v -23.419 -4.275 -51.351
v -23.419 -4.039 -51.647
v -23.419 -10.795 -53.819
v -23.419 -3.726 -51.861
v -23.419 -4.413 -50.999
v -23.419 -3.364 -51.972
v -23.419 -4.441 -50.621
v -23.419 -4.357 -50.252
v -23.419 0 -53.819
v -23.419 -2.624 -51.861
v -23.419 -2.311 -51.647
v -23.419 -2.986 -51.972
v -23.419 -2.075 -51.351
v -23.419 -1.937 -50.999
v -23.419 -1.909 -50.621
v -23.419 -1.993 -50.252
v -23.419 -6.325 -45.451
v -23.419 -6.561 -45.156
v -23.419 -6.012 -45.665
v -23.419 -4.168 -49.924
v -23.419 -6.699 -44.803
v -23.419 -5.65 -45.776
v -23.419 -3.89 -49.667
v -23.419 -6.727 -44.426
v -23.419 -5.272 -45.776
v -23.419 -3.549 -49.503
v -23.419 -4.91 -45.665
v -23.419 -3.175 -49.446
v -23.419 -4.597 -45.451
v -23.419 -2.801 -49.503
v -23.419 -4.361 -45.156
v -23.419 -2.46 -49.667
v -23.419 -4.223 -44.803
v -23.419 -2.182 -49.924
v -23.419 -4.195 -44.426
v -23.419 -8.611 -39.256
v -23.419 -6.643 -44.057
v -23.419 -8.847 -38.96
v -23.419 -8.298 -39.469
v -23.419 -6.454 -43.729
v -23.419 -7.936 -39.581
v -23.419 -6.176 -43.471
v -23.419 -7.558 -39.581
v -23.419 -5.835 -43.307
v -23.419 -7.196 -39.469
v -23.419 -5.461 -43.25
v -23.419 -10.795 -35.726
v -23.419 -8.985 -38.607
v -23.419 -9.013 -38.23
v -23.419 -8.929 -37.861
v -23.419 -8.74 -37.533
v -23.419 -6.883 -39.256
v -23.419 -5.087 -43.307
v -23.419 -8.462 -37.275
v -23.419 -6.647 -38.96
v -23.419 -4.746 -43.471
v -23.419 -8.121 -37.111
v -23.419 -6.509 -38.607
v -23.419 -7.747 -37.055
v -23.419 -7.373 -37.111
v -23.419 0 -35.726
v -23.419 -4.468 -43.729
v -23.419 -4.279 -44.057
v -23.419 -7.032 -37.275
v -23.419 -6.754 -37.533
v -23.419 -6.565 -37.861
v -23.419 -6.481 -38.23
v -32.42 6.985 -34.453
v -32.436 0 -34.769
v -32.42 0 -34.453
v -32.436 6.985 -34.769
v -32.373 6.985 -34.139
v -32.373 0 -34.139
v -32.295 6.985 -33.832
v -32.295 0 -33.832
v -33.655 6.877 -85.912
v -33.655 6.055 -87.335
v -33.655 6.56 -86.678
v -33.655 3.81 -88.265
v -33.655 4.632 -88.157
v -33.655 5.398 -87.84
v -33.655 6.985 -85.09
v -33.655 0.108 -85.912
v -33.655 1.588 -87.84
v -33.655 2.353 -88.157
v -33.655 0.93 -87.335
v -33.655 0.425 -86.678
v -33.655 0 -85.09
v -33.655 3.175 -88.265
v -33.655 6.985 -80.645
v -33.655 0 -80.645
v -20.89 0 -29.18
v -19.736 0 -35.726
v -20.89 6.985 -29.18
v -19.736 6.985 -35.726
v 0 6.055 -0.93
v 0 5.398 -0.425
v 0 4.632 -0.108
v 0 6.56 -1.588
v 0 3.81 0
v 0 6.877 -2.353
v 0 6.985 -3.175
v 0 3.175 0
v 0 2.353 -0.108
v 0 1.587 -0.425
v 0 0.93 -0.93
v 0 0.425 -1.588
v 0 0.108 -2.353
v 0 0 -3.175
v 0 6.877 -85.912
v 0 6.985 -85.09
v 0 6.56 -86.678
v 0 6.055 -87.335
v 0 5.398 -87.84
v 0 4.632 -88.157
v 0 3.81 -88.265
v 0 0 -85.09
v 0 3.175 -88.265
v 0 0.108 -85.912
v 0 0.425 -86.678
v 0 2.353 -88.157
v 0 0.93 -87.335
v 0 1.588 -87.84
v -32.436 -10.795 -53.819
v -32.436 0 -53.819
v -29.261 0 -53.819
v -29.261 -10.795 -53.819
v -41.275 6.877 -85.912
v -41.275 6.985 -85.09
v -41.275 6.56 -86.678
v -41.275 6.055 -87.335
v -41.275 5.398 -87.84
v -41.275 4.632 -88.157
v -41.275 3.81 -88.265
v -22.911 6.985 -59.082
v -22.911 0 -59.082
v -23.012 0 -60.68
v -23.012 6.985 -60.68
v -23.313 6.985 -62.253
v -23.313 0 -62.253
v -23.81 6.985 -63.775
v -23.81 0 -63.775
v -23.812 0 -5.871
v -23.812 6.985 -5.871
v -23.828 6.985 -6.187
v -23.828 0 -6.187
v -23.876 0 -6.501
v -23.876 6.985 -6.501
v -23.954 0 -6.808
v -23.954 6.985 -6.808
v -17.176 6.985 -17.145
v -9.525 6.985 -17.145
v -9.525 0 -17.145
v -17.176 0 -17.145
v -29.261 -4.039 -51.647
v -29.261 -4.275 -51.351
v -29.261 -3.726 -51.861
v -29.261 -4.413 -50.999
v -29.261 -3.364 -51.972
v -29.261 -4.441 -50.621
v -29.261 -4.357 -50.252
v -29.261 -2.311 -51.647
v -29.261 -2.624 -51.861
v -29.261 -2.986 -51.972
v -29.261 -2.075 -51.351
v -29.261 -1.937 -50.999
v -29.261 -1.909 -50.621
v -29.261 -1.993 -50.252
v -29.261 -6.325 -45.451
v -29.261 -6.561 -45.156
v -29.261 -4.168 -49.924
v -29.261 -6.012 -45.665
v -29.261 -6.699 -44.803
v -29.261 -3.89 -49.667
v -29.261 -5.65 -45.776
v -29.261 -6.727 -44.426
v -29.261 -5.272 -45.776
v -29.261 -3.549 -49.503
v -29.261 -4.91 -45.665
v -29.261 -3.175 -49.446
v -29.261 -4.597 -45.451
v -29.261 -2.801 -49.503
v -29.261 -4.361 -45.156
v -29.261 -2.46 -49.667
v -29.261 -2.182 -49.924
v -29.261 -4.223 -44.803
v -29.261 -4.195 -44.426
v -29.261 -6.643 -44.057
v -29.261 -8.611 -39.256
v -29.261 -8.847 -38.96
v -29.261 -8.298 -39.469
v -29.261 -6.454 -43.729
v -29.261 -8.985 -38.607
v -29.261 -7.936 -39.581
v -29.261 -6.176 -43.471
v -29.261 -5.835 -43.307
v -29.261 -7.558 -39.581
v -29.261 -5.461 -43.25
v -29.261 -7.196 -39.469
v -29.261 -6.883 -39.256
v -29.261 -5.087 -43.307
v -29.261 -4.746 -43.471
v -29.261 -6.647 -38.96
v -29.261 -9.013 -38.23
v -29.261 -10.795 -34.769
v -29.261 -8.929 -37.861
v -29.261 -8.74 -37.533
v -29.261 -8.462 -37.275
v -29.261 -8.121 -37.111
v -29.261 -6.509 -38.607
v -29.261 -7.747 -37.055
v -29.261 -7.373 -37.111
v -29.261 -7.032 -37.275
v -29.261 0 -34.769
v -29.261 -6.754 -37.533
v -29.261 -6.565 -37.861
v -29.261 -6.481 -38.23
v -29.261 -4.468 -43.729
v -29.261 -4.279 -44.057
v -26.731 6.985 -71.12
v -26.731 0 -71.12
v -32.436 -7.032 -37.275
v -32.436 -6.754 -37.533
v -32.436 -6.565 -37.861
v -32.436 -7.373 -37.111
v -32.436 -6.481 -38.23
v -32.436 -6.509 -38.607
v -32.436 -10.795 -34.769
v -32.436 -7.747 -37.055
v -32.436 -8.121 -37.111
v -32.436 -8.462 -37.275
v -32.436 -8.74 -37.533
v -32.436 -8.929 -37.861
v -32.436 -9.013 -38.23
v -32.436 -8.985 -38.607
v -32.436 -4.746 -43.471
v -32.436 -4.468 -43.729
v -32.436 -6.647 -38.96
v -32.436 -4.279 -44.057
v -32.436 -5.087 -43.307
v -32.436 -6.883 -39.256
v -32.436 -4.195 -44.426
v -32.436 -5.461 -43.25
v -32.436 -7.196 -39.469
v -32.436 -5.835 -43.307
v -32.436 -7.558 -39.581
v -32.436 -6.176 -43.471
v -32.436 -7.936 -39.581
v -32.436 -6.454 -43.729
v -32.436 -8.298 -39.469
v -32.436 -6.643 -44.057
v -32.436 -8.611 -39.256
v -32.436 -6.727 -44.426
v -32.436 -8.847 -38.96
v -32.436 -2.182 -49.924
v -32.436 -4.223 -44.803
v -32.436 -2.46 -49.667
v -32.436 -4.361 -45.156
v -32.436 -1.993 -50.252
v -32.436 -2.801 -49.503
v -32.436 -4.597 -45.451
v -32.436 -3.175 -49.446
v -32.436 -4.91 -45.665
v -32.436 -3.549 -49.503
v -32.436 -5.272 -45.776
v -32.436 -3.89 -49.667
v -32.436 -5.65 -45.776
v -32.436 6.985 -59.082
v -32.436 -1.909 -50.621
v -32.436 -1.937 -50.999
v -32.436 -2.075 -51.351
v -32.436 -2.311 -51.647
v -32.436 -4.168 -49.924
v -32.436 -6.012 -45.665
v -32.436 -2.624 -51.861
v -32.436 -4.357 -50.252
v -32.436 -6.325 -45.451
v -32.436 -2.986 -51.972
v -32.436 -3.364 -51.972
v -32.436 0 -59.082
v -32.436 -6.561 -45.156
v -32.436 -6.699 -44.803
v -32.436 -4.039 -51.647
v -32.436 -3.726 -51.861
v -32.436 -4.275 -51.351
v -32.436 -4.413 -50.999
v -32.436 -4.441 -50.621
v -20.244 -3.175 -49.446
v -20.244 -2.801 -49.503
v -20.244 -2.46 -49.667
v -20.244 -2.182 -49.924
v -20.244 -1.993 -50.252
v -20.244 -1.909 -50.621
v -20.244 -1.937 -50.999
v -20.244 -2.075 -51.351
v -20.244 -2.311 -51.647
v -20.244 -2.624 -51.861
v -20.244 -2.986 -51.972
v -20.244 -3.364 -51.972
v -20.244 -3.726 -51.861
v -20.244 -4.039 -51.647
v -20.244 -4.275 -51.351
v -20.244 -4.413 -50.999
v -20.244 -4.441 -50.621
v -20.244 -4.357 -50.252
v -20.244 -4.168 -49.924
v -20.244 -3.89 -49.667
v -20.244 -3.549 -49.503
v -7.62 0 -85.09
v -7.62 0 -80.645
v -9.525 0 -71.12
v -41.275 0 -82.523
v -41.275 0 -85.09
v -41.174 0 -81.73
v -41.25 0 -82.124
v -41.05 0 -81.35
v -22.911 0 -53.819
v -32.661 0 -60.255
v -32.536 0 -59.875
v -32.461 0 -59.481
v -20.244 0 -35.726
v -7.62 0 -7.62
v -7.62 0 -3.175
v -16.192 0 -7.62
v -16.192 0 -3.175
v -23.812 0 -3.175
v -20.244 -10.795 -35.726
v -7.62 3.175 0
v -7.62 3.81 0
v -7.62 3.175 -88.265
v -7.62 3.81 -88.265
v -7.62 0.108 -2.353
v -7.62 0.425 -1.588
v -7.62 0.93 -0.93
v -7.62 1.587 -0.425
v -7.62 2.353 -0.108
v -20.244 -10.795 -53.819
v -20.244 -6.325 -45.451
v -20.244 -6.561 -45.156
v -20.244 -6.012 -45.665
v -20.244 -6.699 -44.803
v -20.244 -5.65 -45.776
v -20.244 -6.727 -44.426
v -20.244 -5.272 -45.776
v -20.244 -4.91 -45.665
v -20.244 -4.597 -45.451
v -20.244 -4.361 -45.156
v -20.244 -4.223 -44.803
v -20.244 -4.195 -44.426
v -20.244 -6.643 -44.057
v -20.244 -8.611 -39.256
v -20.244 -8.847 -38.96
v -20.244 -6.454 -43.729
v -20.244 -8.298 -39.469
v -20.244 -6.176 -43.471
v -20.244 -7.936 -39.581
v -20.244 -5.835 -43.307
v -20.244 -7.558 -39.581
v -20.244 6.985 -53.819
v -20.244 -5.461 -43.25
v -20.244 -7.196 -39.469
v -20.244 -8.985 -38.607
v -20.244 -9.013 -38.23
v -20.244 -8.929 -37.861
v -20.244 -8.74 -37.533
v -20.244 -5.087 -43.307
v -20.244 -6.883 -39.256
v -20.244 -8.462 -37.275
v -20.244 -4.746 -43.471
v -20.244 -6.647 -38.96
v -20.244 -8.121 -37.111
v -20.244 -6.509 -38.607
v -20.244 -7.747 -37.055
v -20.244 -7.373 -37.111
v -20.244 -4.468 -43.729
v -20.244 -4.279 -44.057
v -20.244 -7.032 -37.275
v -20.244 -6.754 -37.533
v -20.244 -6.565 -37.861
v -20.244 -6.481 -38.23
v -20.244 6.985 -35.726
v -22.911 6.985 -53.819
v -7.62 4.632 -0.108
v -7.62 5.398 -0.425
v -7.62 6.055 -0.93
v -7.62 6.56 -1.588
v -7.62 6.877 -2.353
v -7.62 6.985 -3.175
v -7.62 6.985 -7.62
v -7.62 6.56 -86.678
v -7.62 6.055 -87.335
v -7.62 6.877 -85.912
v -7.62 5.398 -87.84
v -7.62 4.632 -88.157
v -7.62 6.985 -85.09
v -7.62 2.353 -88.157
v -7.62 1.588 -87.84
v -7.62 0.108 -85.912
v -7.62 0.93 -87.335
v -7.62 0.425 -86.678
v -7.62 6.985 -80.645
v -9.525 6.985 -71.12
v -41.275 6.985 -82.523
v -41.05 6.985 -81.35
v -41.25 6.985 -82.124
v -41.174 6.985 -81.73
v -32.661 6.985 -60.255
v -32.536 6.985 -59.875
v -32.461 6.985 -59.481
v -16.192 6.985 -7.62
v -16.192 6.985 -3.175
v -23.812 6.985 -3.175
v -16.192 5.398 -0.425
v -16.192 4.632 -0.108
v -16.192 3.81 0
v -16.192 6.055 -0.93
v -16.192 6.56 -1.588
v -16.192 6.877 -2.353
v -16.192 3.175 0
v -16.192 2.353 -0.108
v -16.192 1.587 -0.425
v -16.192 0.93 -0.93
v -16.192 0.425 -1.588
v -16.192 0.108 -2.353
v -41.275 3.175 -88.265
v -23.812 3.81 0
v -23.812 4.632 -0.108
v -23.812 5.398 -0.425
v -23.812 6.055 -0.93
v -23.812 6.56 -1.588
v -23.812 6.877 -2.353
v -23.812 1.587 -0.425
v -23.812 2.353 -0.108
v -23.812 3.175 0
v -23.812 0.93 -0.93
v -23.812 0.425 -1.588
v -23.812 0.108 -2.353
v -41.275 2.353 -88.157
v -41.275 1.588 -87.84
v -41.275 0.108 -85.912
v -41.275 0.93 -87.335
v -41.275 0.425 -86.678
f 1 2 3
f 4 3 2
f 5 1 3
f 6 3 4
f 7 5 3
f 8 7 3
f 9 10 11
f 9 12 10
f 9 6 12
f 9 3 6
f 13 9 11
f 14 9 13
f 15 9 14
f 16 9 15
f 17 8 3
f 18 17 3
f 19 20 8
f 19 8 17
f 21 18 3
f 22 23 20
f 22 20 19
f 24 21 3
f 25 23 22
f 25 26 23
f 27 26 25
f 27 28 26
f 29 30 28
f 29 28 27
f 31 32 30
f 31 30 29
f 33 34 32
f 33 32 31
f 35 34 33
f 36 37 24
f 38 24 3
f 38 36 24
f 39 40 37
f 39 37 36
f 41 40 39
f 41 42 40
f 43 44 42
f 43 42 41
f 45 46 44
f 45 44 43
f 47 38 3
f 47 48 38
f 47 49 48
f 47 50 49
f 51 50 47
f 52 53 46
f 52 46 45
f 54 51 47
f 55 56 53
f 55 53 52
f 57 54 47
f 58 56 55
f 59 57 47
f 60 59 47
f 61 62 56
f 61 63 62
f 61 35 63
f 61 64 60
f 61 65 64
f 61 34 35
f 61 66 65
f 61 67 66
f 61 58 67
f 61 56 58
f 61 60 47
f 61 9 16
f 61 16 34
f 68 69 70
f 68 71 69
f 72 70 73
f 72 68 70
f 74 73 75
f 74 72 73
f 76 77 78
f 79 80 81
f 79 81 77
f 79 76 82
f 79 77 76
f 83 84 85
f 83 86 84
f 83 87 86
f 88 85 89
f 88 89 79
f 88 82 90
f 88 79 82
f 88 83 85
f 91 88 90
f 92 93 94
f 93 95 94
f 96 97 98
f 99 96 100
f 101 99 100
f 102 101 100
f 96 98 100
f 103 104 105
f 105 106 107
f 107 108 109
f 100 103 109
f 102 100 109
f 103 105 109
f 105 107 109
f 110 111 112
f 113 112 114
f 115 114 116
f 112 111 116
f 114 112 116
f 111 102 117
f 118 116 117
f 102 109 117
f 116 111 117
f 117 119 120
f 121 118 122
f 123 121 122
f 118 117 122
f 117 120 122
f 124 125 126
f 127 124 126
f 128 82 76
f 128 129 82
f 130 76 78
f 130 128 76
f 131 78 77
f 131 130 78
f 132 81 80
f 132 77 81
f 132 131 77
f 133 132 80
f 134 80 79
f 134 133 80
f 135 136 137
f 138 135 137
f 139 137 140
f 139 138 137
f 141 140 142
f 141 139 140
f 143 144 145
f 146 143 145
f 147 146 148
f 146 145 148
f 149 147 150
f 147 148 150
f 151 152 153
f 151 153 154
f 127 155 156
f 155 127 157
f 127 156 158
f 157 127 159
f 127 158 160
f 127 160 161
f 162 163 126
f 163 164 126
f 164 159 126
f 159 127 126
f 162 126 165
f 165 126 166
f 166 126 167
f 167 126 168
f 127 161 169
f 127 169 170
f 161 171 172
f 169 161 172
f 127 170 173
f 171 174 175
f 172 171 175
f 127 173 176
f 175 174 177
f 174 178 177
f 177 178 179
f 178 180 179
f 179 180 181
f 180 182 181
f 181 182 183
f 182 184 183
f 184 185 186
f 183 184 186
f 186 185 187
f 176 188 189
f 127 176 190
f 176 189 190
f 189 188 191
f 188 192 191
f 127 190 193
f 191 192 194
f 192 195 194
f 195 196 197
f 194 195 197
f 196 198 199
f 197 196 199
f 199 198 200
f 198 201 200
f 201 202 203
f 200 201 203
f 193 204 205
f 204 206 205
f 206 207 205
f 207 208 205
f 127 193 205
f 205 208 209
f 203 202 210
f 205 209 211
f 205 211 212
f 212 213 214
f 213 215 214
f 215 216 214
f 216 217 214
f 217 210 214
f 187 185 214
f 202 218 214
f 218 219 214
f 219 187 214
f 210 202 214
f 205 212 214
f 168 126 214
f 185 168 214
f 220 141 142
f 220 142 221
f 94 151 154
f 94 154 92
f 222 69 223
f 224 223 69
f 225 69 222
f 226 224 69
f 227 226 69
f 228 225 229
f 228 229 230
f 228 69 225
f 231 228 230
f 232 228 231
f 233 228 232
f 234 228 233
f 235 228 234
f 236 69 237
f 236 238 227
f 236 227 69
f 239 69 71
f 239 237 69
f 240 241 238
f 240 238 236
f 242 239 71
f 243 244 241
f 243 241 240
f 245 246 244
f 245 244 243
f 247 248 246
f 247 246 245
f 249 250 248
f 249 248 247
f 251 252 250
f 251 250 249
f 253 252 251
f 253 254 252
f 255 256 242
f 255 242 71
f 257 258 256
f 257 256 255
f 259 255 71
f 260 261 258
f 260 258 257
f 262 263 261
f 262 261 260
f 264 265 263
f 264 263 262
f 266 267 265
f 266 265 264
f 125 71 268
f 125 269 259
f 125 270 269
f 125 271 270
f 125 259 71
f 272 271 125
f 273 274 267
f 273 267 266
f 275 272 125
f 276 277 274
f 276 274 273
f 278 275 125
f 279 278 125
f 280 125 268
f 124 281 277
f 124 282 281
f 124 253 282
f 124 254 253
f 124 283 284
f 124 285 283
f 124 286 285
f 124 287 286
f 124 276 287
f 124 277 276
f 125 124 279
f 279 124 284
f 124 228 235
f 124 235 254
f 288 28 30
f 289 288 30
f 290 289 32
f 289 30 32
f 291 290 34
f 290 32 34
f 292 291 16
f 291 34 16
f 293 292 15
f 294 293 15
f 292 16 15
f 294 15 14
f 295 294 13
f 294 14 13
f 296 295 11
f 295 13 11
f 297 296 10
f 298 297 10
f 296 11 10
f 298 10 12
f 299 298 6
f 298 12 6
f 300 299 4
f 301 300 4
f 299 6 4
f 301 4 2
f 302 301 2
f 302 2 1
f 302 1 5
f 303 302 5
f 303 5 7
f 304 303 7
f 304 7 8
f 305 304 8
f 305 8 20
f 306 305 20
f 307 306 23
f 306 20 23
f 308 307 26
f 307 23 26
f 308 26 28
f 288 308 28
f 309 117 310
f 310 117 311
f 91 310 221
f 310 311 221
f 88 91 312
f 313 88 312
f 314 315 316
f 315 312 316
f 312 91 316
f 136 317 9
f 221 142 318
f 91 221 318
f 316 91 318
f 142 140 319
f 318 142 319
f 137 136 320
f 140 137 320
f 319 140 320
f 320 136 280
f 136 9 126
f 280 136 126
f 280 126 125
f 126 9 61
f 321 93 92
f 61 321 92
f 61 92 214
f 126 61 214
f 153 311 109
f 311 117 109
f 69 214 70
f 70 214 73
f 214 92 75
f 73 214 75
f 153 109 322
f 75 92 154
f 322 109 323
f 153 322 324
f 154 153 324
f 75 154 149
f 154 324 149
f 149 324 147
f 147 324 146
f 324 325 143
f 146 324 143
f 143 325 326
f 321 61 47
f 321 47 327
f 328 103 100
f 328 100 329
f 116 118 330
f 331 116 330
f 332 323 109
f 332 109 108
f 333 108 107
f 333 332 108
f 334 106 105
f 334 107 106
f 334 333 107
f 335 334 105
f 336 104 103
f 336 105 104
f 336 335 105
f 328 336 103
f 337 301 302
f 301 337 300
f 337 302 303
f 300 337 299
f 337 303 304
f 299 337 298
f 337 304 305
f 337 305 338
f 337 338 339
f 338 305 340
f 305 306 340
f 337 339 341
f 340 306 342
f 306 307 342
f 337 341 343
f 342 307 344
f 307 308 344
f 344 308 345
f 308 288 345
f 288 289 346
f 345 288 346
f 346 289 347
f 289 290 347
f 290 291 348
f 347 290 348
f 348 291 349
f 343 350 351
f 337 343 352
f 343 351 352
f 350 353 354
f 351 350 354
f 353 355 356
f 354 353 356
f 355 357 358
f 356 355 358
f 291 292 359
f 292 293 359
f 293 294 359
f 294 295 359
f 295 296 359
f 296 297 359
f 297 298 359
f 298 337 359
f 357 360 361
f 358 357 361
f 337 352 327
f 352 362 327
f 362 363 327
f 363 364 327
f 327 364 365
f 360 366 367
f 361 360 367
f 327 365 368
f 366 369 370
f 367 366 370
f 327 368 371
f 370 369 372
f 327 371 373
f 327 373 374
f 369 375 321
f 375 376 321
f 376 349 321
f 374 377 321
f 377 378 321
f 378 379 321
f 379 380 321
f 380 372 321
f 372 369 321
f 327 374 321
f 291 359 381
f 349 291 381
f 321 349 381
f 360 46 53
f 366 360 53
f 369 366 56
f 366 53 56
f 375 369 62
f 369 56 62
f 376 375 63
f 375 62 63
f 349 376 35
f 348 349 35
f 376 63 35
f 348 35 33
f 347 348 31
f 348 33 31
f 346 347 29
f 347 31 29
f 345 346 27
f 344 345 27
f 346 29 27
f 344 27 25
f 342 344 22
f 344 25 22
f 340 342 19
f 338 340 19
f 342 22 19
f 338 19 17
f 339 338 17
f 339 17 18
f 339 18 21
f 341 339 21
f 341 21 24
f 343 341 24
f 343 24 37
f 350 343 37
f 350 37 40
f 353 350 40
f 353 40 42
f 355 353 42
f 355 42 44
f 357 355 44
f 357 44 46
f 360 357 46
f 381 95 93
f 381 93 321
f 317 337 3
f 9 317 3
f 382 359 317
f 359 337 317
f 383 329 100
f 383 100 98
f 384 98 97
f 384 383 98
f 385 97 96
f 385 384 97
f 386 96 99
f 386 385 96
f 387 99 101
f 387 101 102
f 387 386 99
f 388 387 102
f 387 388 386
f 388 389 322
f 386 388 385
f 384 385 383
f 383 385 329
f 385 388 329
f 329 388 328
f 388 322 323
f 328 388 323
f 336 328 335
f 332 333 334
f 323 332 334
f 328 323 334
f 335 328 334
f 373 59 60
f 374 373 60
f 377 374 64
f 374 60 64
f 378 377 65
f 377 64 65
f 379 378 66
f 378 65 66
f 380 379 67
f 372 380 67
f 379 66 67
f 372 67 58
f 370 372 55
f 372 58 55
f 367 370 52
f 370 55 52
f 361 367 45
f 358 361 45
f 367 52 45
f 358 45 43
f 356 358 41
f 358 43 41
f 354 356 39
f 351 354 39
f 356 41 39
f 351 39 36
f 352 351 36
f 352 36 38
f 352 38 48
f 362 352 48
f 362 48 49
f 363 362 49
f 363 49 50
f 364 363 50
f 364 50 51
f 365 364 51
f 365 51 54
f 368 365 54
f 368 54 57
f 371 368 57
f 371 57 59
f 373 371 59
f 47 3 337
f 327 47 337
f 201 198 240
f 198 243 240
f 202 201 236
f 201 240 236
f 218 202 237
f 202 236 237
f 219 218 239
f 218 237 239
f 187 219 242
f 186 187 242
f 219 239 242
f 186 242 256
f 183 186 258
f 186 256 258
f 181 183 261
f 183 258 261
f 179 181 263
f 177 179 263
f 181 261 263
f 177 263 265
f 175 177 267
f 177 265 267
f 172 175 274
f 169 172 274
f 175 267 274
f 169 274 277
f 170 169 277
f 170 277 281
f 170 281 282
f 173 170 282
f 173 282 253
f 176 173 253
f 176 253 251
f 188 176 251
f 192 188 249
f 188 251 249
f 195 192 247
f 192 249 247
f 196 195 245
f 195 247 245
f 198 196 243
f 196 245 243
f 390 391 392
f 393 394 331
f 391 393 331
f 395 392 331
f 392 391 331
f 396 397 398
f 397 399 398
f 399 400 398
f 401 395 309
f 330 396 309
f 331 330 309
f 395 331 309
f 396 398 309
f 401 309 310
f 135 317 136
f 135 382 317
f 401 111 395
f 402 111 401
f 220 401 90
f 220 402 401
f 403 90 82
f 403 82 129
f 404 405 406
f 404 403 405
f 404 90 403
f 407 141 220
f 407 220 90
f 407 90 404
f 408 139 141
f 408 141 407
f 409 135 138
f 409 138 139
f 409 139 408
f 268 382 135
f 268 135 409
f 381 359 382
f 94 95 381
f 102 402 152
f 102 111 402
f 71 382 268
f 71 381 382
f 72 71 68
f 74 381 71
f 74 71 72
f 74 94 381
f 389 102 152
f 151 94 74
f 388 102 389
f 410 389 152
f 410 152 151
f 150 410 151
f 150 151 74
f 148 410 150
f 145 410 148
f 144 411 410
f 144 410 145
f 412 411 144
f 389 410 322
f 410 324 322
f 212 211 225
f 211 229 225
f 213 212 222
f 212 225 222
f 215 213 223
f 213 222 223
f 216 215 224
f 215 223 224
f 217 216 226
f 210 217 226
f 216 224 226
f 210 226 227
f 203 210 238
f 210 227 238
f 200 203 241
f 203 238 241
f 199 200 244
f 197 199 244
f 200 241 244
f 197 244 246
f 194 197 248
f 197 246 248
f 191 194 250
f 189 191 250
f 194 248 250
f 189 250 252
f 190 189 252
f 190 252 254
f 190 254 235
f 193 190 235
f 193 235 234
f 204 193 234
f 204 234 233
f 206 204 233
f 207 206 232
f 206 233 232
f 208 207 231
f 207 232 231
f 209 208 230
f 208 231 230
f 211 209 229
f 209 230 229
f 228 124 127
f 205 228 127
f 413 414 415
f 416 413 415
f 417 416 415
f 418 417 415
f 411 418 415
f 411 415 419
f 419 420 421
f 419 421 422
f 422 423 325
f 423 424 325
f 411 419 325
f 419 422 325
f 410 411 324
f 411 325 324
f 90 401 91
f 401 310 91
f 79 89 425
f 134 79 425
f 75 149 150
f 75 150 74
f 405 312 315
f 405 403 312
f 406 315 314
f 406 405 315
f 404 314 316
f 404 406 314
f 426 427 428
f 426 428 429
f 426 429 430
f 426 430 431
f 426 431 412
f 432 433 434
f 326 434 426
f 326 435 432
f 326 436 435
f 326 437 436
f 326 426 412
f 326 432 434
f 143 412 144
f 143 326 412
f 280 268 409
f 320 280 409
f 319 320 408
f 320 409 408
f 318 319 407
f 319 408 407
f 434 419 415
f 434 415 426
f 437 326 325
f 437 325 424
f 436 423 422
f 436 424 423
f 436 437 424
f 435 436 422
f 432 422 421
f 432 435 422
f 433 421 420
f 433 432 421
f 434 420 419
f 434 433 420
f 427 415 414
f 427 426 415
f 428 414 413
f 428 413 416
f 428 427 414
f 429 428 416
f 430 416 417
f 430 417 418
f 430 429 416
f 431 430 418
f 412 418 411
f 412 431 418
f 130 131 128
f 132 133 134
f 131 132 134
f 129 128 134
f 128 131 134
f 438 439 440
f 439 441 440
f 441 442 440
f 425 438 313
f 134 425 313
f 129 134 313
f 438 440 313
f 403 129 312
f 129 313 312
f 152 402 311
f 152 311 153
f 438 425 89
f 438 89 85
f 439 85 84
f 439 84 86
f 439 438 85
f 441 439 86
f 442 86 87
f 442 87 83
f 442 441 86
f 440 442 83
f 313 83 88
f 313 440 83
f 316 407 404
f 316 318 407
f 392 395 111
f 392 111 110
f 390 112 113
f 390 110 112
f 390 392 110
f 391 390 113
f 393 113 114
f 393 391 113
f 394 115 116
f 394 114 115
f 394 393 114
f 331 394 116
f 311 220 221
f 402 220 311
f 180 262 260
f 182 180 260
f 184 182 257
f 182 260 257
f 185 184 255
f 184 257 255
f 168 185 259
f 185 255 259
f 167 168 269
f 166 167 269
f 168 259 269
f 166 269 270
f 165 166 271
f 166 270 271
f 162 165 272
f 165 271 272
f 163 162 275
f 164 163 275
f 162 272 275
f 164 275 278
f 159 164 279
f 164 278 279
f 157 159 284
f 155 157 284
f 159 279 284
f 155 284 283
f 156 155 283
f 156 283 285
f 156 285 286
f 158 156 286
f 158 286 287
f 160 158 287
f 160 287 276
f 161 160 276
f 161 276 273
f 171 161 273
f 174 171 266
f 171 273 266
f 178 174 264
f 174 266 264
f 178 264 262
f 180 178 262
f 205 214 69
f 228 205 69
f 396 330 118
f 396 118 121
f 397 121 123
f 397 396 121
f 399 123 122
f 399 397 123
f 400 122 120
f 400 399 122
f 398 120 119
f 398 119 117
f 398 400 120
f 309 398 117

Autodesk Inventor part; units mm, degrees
ref_plane "YZ Plane" through (0, 0, 0) normal (1, 0, 0) x (0, 1, 0)
ref_plane "XZ Plane" through (0, 0, 0) normal (0, 1, 0) x (-1, 0, 0)
ref_plane "XY Plane" through (0, 0, 0) normal (0, 0, 1) x (1, 0, 0)
sketch "Sketch1" plane through (0, 0, 0) normal (0, 1, 0) x (-1, 0, 0)
  line L0 (0, 0) -> (0, -88.265)
  line L1 (0, -88.265) -> (41.275, -88.265)
  line L2 (0, 0) -> (23.8125, 0)
  line L3 (32.4358, -34.29) -> (32.4358, -59.69)
  line L4 (41.275, -88.265) -> (41.275, -81.915)
  line L5 (23.8125, 0) -> (23.8125, -6.35)
  line L6 (23.8125, -6.35) -> (32.4358, -34.29)
  line L7 (32.4358, -59.69) -> (41.275, -81.915)
  line L8 (33.655, -88.265) -> (33.655, -80.645)
  line L9 (7.62, -88.265) -> (7.62, -80.645)
  line L10 (7.62, -80.645) -> (33.655, -80.645)
  line L11 (16.1925, 0) -> (16.1925, -7.62)
  line L12 (16.1925, -7.62) -> (7.62, -7.62)
  line L13 (7.62, -7.62) -> (7.62, 0)
  point P0 (32.4358, -46.99)
  dimension "d0" = 88.265
  dimension "d1" = 41.275
  dimension "d2" = 23.8125
  dimension "d3" = 41.275
  dimension "d4" = 32.4358
  dimension "d5" = 25.4
  dimension "d6" = 12.7
  dimension "d10" = 6.35
  dimension "d11" = 6.35
  dimension "d12" = 7.62
  dimension "d13" = 7.62
  dimension "d14" = 7.62
  dimension "d15" = 7.62
  dimension "d16" = 7.62
  dimension "d17" = 7.62
extrude "Extrusion1" add sketch "Sketch1" along normal blind 6.985 contours L2 L13 L12 L11 L5 L6 L3 L7 L4 L1 L8 L10 L9 L0
fillet "Fillet2" radius 3.175 12 edges at (-41.275, 3.4925, -81.915) (-32.4358, 3.4925, -59.69) (-32.4358, 3.4925, -34.29) (-23.8125, 3.4925, -6.35) (-3.81, 0, 0) (-3.81, 6.985, 0) (-20.0025, 0, 0) (-20.0025, 6.985, 0) (-37.465, 0, -88.265) (-37.465, 6.985, -88.265) (-3.81, 0, -88.265) (-3.81, 6.985, -88.265)
sketch "Sketch2" plane through (0, 6.985, 0) normal (0, 1, 0) x (1, 0, 0)
  line L0 (-7.62, 85.09) -> (0, 85.09) projected
  line L1 (-7.62, 85.09) -> (-7.62, 80.645) projected
  line L2 (-7.62, 80.645) -> (-33.655, 80.645) projected
  line L3 (-33.655, 80.645) -> (-33.655, 85.09) projected
  line L4 (-41.275, 85.09) -> (-33.655, 85.09) projected
  line L5 (-41.275, 85.09) -> (-41.275, 82.5232) projected
  arc A0 (-41.275, 82.5232) -> (-41.0502, 81.3499) centre (-38.1, 82.5232) ccw projected
  line L6 (-41.0502, 81.3499) -> (-32.6606, 60.2551) projected
  arc A1 (-32.4358, 59.0818) -> (-32.6606, 60.2551) centre (-35.6108, 59.0818) ccw projected
  line L7 (-32.4358, 59.0818) -> (-32.4358, 34.7688) projected
  arc A2 (-32.4358, 34.7688) -> (-32.2946, 33.8325) centre (-29.2608, 34.7688) ccw projected
  line L8 (-32.2946, 33.8325) -> (-23.9537, 6.8075) projected
  arc A3 (-23.8125, 5.8712) -> (-23.9537, 6.8075) centre (-26.9875, 5.8712) ccw projected
  line L9 (-23.8125, 5.8712) -> (-23.8125, 3.175) projected
  line L10 (-16.1925, 3.175) -> (-23.8125, 3.175) projected
  line L11 (-16.1925, 3.175) -> (-16.1925, 7.62) projected
  line L12 (-16.1925, 7.62) -> (-7.62, 7.62) projected
  line L13 (-7.62, 7.62) -> (-7.62, 3.175) projected
  line L14 (0, 3.175) -> (-7.62, 3.175) projected
  line L15 (0, 3.175) -> (0, 85.09) projected
  line L16 (-22.9108, 35.7265) -> (-22.9108, 59.0818)
  arc A4 (-22.9108, 59.0818) -> (-23.8099, 63.7752) centre (-35.6108, 59.0818) ccw
  line L17 (-23.8099, 63.7752) -> (-26.731, 71.12)
  line L18 (-26.731, 71.12) -> (-9.525, 71.12)
  line L19 (-9.525, 71.12) -> (-9.525, 17.145)
  line L20 (-9.525, 17.145) -> (-17.1759, 17.145)
  line L21 (-17.1759, 17.145) -> (-22.9108, 35.7265)
  line L22 (-32.4358, 59.0818) -> (-32.4358, 34.7688) projected
  line L23 (-32.4358, 53.8188) -> (-29.2608, 53.8188)
  line L24 (-29.2608, 53.8188) -> (-29.2608, 34.7688)
  line L25 (-29.2608, 34.7688) -> (-32.4358, 34.7688)
  line L26 (-32.4358, 34.7688) -> (-32.4358, 59.0818)
  line L27 (-19.7358, 54.7765) -> (-19.7358, 35.7265)
  line L28 (-19.7358, 35.7265) -> (-22.9108, 35.7265)
  line L29 (-19.7358, 35.7265) -> (-20.8902, 29.1796)
  line L30 (-22.9108, 35.7265) -> (-22.9108, 54.7765)
  line L31 (-22.9108, 54.7765) -> (-19.7358, 54.7765)
  point P0 (0, 0)
  dimension "d19" = 9.525
  dimension "d25" = 3.175
  dimension "d26" = 3.175
  dimension "d28" = 80
  dimension "d44" = 19.05
  dimension "d45" = 19.05
  dimension "d46" = 19.05
extrude "Extrusion2" cut sketch "Sketch2" against normal blind 6.985 contours L16 L31 L27 L28 | L16 A4 L17 L18 L19 L20 L21 L29 L27 L31
sketch "Sketch3" plane through (0, 6.985, 0) normal (0, 1, 0) x (1, 0, 0)
  line L0 (-32.4358, 59.0818) -> (-32.4358, 34.7688) projected
  line L1 (-32.4358, 59.0818) -> (-29.2608, 59.0818)
  line L2 (-29.2608, 59.0818) -> (-29.2608, 34.7688)
  line L3 (-29.2608, 34.7688) -> (-32.4358, 34.7688)
  line L4 (-32.4358, 34.7688) -> (-32.4358, 59.0818)
  line L5 (-20.8902, 29.1796) -> (-17.1759, 17.145) projected
  line L6 (-23.4823, 59.0818) -> (-22.9108, 59.0818)
  line L7 (-22.9108, 59.0818) -> (-22.9108, 35.7265)
  line L8 (-22.9108, 35.7265) -> (-23.4823, 35.7265)
  line L9 (-23.4823, 35.7265) -> (-23.4823, 59.0818)
  point P0 (0, 0)
  dimension "d22" = 3.175
  dimension "d24" = 5.7785
sketch "Sketch4" plane through (0, 6.985, 0) normal (0, 1, 0) x (1, 0, 0)
  line L0 (-32.4358, 53.8188) -> (-29.2608, 53.8188)
  line L1 (-29.2608, 53.8188) -> (-29.2608, 34.7688)
  line L2 (-29.2608, 34.7688) -> (-32.4358, 34.7688)
  line L3 (-32.4358, 34.7688) -> (-32.4358, 53.8188)
  line L4 (-20.2438, 59.0818) -> (-20.2438, 35.7265) projected
  line L5 (-20.2438, 53.8188) -> (-23.4188, 53.8188)
  line L6 (-23.4188, 53.8188) -> (-23.4188, 35.7265)
  line L7 (-23.4188, 35.7265) -> (-20.2438, 35.7265)
  line L8 (-20.2438, 35.7265) -> (-20.2438, 59.0818)
  point P0 (0, 0)
  dimension "d29" = 3.175
  dimension "d30" = 3.175
  dimension "d43" = 19.05
extrude "Extrusion3" add sketch "Sketch4" against normal blind 17.78
sketch "Sketch5" plane through (-32.4358, 6.985, -59.0818) normal (-1, 0, 0) x (0, 0, 1)
  circle A0 centre (20.757, -14.732) radius 1.27
  line L0 (0, 0) -> (24.313, 0) projected
  circle A1 centre (14.5613, -12.446) radius 1.27
  circle A2 centre (8.3655, -10.16) radius 1.27
  line L1 (24.313, -6.985) -> (24.313, -17.78) projected
  line L2 (20.757, -14.732) -> (8.3655, -10.16) construction
  point P0 (59.0818, -6.985)
  dimension "d33" = 2.54
  dimension "d34" = 14.732
  dimension "d35" = 2.54
  dimension "d36" = 6.604
  dimension "d37" = 2.54
  dimension "d38" = 6.604
  dimension "d39" = 10.16
  dimension "d40" = 3.556
extrude "Extrusion4" cut sketch "Sketch5" against normal blind 25.4
sketch "Sketch6" plane through (-23.8125, 0, -5.8712) normal (-1, 0, 0) x (0, 0, 1)
  circle A0 centre (2.5695, 3.5161) radius 1.651
  point P0 (5.8712, 0)
  dimension "d47" = 3.302
equation "\"d38\" = d36"
